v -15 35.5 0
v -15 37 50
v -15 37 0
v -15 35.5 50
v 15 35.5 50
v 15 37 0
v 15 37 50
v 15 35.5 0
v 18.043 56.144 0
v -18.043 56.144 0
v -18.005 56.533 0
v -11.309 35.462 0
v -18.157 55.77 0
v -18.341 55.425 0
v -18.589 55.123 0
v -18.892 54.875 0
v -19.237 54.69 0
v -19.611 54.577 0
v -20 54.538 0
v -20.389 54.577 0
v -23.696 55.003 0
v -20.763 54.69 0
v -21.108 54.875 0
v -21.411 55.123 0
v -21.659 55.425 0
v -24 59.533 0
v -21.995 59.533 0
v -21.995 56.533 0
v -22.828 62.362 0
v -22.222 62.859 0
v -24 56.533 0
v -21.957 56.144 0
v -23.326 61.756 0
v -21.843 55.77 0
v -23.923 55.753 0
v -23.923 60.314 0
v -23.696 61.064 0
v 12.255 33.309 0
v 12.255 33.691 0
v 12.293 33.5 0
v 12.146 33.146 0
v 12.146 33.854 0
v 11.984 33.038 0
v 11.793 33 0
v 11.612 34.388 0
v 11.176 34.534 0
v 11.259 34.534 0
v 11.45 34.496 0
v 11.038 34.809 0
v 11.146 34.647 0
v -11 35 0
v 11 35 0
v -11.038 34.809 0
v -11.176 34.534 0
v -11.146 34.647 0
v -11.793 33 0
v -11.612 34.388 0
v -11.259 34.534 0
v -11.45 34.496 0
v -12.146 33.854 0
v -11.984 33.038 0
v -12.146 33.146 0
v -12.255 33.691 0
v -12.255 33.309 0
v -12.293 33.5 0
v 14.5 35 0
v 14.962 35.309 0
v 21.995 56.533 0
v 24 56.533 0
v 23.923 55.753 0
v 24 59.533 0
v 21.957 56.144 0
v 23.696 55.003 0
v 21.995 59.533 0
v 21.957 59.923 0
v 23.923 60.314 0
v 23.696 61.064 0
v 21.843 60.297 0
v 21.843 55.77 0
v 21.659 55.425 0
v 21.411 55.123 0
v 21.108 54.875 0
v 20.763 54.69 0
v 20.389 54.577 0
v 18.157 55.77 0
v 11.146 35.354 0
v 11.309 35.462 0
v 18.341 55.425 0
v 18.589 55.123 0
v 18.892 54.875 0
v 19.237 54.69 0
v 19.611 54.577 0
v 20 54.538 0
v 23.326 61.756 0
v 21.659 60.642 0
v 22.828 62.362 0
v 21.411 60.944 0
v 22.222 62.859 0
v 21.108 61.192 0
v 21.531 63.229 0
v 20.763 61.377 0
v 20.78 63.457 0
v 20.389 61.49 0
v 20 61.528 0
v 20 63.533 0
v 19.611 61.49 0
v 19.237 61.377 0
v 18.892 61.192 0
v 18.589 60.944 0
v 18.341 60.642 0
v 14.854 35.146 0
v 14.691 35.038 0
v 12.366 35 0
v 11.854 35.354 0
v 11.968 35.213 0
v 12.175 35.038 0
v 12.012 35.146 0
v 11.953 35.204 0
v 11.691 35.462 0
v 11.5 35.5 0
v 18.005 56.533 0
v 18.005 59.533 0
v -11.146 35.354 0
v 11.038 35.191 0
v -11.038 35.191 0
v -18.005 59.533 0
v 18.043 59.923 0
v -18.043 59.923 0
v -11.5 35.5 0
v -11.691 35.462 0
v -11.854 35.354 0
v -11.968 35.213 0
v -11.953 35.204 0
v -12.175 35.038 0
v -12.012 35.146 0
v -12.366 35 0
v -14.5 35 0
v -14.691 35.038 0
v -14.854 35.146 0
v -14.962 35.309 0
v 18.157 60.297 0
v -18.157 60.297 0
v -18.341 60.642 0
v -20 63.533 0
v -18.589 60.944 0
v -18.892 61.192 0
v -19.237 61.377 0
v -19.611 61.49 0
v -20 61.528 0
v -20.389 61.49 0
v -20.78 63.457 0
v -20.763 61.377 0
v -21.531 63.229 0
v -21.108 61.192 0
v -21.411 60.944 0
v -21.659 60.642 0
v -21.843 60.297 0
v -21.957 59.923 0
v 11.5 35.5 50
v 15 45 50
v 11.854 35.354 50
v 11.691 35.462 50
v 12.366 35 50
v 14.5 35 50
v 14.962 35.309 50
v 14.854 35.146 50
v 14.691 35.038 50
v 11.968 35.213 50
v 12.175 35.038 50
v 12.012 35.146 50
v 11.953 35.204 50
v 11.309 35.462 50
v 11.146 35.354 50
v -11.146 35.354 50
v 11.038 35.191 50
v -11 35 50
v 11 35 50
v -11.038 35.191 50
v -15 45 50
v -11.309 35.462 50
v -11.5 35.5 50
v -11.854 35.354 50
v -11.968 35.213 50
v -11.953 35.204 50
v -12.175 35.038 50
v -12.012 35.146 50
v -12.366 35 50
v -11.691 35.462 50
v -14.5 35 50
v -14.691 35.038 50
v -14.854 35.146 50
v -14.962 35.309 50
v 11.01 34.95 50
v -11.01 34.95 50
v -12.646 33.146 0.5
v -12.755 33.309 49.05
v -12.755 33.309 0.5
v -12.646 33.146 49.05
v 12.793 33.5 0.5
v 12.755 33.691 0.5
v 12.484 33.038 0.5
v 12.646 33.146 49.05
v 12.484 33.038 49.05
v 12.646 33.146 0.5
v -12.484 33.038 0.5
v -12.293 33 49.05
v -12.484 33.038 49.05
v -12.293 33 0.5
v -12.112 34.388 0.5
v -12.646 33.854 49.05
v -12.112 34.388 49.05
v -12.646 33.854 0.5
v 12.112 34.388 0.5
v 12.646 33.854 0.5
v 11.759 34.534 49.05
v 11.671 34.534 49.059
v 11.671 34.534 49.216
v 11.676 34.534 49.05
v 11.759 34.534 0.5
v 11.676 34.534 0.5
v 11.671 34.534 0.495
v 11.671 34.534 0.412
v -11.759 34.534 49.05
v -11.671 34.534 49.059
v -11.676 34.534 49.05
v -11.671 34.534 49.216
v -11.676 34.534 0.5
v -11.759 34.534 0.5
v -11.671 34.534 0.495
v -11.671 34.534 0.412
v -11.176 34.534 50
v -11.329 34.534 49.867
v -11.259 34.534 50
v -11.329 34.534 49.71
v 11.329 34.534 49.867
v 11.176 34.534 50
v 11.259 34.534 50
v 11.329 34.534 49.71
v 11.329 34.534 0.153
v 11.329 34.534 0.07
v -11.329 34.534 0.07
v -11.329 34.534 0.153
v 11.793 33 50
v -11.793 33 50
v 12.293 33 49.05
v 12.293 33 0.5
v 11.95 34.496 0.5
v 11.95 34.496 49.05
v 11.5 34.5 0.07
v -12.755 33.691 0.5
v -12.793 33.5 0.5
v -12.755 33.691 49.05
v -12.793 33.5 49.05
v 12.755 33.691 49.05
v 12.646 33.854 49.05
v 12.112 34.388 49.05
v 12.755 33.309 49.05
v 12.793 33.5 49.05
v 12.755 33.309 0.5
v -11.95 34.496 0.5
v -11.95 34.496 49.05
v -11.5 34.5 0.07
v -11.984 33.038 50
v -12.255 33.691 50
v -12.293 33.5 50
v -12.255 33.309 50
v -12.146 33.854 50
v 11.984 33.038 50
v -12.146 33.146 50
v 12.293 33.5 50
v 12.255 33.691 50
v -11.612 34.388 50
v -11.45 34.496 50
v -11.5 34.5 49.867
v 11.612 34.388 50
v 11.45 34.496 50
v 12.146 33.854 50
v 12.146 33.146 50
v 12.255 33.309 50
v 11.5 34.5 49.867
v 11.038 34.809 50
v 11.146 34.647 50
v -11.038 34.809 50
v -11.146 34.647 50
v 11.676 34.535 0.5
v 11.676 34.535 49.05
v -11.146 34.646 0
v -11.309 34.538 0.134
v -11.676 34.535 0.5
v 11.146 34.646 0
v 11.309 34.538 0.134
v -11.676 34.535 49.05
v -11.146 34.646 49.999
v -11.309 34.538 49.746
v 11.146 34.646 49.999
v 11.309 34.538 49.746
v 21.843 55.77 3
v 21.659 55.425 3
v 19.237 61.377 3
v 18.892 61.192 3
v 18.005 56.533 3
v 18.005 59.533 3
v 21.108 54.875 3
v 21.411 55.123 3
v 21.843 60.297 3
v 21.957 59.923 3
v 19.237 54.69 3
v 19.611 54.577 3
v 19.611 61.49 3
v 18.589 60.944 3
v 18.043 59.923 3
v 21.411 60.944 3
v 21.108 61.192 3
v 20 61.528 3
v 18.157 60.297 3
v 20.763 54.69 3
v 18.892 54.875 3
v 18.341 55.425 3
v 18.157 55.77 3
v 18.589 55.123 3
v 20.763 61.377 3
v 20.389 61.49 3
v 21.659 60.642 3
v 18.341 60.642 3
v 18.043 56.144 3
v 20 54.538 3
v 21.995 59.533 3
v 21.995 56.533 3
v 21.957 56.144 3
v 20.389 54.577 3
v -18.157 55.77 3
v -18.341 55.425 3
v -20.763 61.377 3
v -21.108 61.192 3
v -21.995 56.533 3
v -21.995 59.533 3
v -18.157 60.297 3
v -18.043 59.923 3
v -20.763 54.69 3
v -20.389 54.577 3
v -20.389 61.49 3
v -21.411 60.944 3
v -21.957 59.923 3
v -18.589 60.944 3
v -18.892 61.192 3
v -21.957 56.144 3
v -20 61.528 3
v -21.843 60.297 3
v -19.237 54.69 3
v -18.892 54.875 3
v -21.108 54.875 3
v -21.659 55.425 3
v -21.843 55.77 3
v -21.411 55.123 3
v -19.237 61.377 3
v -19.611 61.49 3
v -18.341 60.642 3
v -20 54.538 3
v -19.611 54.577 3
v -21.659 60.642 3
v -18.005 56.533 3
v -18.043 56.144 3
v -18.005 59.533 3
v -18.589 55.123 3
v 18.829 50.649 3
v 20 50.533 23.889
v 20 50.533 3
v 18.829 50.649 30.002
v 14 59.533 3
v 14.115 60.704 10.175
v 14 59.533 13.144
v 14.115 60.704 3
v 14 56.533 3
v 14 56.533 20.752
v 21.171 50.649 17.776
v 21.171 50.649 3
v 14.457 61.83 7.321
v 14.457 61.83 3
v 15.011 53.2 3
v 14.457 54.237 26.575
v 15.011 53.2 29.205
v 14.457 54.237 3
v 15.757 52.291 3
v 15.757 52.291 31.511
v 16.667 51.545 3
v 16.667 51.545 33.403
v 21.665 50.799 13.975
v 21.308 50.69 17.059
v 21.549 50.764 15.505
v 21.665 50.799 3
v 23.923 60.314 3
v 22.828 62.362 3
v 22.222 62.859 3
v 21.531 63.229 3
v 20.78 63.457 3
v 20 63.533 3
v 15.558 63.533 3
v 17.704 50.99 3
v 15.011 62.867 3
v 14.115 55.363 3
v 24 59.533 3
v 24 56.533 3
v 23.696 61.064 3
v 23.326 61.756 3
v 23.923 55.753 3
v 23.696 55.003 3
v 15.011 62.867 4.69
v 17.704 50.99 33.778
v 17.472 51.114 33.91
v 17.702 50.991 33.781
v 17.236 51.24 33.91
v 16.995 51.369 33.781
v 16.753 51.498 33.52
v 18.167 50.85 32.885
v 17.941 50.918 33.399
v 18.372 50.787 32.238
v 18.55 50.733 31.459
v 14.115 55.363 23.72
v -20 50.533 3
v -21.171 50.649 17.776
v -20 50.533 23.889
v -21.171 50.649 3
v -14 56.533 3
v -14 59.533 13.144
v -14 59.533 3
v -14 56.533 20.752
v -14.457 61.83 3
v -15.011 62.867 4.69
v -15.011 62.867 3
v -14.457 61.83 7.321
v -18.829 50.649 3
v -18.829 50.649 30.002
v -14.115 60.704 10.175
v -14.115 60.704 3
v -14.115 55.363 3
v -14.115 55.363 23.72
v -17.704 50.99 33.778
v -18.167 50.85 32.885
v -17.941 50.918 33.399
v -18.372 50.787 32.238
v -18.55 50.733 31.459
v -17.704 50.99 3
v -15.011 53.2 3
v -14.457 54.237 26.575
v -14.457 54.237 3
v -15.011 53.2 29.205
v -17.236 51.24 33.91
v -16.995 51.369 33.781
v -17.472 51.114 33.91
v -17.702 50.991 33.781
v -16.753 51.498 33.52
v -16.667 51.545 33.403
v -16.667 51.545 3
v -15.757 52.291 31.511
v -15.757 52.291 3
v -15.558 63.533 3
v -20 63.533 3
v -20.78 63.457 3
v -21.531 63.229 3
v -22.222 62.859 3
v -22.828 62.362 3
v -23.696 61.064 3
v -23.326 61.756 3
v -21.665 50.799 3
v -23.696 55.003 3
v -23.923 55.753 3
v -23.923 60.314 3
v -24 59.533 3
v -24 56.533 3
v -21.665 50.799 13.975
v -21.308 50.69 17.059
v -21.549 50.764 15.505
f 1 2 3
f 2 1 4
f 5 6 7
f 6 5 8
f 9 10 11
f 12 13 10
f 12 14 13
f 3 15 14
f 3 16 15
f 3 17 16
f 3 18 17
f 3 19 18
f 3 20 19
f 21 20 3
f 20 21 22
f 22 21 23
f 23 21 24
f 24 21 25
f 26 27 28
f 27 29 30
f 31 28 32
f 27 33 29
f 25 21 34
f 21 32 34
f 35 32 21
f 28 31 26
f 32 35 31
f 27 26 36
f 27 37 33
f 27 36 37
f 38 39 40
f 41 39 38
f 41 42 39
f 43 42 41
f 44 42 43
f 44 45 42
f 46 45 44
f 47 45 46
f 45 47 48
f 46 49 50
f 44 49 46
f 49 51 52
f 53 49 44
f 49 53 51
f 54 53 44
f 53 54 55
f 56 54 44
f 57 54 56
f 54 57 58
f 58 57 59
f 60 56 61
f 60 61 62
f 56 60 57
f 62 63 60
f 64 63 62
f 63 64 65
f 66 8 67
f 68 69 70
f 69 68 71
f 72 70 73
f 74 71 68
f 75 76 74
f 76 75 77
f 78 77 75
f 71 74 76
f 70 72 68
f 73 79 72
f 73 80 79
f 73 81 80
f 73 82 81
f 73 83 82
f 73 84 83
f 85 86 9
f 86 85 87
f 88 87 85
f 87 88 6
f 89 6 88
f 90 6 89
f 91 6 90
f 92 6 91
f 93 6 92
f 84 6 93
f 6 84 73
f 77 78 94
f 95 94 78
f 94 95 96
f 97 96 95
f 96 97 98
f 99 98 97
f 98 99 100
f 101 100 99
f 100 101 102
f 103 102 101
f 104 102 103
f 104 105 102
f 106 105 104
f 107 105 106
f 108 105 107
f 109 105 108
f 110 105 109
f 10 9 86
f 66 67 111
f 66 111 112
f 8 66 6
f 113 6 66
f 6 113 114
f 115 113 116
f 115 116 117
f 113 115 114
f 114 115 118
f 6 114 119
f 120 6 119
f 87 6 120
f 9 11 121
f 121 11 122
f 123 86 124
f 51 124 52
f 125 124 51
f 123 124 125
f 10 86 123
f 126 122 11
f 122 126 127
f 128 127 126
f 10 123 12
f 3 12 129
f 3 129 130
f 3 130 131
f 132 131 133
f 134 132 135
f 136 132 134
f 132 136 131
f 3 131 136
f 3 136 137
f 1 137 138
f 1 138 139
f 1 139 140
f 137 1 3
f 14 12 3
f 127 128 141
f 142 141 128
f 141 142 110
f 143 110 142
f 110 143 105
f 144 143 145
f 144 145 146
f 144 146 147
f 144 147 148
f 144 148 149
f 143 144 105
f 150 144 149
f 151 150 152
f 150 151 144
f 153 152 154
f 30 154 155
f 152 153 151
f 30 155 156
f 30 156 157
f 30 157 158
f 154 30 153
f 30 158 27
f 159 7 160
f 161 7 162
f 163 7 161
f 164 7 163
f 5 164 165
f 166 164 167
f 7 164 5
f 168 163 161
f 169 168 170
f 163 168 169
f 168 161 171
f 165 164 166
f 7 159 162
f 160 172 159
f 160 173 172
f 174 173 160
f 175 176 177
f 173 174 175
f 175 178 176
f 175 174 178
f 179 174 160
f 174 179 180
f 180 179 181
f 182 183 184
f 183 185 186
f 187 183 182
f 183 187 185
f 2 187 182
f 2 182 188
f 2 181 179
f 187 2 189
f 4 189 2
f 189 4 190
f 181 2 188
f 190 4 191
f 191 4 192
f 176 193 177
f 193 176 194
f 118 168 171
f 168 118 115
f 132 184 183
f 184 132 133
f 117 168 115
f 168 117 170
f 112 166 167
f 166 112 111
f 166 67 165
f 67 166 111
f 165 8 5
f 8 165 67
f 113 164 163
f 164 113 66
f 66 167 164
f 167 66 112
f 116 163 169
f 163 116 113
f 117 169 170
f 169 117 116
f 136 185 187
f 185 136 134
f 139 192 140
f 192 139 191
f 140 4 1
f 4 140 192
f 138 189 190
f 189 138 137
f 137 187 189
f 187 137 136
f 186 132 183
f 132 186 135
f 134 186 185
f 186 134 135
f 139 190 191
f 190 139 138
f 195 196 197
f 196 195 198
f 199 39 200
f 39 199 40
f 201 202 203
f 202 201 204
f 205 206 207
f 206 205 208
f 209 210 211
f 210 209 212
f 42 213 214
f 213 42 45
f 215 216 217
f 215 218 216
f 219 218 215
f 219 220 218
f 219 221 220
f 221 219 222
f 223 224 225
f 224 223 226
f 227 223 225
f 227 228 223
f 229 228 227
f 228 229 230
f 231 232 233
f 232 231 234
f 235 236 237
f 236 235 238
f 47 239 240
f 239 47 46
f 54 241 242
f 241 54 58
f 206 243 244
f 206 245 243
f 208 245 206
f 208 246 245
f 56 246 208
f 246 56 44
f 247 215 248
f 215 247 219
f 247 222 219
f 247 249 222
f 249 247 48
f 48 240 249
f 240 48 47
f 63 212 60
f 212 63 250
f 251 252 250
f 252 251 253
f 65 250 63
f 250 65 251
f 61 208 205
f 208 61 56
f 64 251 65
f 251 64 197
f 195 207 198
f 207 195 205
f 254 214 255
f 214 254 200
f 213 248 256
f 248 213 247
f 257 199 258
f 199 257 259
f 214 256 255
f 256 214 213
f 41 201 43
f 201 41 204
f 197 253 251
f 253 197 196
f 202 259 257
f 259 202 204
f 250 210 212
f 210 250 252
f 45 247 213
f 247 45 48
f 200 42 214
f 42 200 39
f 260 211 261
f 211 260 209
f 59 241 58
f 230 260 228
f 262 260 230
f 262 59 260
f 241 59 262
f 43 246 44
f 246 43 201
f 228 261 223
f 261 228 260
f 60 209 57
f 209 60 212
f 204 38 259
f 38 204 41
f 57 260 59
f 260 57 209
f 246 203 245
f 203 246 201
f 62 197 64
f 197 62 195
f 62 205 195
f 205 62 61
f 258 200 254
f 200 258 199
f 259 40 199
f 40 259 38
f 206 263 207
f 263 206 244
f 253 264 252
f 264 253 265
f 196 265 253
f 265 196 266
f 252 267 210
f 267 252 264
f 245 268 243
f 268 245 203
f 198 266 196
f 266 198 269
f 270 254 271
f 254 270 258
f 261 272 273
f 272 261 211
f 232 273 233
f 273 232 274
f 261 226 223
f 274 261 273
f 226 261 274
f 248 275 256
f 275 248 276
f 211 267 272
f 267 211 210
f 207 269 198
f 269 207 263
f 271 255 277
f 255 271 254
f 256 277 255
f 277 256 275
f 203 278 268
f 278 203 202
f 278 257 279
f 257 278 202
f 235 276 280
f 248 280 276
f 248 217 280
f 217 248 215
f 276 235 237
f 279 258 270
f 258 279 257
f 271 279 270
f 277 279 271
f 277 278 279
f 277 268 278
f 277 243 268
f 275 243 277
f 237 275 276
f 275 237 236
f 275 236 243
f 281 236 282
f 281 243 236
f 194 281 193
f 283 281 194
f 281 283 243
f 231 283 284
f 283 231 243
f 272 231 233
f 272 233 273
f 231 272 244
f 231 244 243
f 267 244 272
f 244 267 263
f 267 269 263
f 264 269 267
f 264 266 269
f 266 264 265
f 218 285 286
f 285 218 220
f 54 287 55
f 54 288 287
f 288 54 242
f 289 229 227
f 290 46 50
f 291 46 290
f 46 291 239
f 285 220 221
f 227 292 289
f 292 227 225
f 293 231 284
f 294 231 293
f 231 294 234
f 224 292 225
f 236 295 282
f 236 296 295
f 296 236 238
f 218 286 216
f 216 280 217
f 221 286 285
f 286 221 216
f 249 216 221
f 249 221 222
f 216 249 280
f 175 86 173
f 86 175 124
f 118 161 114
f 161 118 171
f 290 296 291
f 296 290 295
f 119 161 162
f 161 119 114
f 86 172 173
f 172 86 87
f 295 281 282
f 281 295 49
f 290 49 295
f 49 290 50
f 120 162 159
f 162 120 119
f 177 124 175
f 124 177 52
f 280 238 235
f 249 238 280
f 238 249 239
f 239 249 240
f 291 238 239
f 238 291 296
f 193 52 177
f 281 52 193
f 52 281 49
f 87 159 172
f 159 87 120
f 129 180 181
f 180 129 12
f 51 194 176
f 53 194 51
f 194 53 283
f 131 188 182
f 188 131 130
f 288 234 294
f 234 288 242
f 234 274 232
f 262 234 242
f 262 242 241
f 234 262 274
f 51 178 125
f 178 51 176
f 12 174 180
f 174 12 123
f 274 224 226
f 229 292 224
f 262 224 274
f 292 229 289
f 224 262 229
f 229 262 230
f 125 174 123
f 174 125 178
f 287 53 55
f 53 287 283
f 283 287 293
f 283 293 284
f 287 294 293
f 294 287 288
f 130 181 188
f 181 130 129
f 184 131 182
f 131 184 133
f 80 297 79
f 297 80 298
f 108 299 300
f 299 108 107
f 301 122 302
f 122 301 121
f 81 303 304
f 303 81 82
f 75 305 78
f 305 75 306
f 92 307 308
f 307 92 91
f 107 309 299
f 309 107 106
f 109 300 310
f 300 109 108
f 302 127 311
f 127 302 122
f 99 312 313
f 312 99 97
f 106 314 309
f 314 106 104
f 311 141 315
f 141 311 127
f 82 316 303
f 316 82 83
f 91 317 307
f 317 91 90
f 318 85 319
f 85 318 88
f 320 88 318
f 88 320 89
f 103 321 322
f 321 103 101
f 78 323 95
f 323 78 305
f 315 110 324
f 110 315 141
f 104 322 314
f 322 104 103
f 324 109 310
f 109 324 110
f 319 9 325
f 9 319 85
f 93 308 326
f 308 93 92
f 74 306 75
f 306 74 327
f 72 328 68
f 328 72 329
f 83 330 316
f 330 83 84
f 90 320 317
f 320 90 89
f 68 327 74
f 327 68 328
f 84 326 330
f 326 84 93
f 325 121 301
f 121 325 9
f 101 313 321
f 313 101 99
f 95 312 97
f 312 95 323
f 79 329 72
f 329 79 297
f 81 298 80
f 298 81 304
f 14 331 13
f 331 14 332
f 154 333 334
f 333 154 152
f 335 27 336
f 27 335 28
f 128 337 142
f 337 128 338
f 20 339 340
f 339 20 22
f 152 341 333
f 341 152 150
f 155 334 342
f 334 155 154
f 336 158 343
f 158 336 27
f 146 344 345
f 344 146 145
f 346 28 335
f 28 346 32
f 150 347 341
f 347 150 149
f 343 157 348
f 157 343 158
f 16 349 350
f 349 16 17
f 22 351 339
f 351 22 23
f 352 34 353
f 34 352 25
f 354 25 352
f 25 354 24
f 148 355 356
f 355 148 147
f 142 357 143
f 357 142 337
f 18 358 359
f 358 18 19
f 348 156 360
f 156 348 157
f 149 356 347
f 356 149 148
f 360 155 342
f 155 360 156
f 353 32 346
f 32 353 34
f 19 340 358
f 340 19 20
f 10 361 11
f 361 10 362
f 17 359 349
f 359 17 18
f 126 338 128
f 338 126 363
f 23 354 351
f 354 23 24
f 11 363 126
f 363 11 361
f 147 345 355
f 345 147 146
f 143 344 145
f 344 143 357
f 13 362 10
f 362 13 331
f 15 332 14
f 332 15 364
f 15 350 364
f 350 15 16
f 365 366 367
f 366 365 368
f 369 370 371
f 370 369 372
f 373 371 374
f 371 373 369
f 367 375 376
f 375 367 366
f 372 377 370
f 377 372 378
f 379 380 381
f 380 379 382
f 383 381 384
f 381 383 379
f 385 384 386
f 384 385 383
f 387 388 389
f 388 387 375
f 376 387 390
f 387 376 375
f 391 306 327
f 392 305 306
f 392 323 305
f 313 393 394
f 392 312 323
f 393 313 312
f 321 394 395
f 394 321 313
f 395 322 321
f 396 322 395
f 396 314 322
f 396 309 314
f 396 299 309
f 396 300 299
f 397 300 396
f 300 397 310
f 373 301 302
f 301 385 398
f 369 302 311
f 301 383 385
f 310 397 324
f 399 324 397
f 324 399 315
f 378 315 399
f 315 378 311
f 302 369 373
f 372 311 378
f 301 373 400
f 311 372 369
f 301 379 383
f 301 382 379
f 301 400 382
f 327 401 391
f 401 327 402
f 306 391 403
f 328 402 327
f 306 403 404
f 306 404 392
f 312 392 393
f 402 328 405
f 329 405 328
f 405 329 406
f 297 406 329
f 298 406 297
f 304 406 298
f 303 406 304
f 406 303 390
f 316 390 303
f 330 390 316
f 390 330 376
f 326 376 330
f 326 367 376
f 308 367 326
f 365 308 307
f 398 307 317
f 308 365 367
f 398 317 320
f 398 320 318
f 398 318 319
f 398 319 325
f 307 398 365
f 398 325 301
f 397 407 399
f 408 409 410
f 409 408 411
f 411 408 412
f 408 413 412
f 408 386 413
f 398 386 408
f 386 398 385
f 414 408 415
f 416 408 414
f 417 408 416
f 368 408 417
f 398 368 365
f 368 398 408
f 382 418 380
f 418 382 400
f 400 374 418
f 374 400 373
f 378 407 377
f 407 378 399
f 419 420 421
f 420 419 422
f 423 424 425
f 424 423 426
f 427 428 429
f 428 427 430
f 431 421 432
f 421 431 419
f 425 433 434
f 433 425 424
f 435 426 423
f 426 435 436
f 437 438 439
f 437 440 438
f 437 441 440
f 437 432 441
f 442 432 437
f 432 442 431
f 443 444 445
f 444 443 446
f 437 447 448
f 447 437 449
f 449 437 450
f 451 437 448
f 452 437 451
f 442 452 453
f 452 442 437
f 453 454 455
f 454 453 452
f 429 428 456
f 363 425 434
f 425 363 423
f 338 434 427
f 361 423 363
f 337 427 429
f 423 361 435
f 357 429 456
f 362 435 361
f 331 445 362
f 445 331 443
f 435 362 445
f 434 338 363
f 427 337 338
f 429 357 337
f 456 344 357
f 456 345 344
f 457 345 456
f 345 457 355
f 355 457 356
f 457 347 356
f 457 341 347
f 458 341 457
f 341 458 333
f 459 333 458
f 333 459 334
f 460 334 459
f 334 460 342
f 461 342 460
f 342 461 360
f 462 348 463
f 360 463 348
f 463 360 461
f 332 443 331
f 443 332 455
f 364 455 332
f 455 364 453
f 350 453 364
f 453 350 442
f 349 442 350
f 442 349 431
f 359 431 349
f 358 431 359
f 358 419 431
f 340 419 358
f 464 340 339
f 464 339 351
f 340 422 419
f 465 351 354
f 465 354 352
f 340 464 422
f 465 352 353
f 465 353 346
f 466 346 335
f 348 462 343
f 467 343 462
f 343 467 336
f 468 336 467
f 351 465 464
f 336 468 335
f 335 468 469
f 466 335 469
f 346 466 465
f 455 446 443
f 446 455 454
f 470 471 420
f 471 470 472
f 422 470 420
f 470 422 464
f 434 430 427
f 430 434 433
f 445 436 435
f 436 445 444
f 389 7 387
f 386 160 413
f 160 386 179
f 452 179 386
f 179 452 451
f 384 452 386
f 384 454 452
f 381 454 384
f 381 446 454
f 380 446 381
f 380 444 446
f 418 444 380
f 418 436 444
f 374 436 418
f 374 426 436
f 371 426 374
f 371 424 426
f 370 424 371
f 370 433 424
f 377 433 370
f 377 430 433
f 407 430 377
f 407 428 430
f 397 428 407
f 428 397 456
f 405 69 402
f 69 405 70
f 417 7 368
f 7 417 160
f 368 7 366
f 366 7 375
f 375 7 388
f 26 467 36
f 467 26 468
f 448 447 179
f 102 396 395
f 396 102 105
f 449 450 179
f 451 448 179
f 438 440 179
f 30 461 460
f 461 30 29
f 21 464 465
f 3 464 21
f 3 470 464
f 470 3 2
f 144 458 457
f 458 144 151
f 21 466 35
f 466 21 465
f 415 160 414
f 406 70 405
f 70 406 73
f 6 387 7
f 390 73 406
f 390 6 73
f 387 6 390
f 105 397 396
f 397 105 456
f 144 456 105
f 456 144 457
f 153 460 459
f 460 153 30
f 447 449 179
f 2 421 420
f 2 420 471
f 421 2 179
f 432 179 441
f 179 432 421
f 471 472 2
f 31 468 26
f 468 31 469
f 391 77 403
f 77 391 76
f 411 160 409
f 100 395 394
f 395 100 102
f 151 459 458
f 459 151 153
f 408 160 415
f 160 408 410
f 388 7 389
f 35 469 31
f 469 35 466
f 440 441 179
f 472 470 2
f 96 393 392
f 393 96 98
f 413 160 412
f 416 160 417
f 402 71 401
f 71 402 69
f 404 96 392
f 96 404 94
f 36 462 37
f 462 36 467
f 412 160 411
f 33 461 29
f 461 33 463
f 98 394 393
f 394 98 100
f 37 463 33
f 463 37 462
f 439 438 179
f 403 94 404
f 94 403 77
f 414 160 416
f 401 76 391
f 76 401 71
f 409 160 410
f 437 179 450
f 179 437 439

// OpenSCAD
// file: illumination.scad
/******************************************************************
*                                                                 *
* OpenFlexure Microscope: Illumination                            *
*                                                                 *
* The illumination module includes the condenser lens mounts and  *
* the arm that holds them.                                        *
*                                                                 *
* (c) Richard Bowman, April 2018                                  *
* Released under the CERN Open Hardware License                   *
*                                                                 *
******************************************************************/

use <./utilities.scad>;
include <./microscope_parameters.scad>;
use <./dovetail.scad>;
front_dovetail_y = 35; // position of the main dovetail
front_dovetail_w = 30; // width of the main dovetail


module each_illumination_arm_screw(){
    // A transform to repeat objects at each mounting point
    for(p=illumination_arm_screws) translate(p) children();
}

module cyl_slot(r=1, h=1, dy=2, center=false){
    hull() repeat([0,dy,0],2,center=true) cylinder(r=r, h=h, center=center);
}

module illumination_arm(){
    // The arm on which we mount the illumination
    bottom_z = illumination_arm_screws[0][2]; // z position where we mount it
    h = 50;
    
    translate([0,front_dovetail_y,bottom_z]) mirror([0,1,0]) dovetail_m([front_dovetail_w, 10, h]);
    
    difference(){
        hull(){
            translate([-front_dovetail_w/2,front_dovetail_y+2,bottom_z]) cube([front_dovetail_w, 10-2, h]);
            each_illumination_arm_screw() cyl_slot(r=4, h=3, dy=3);
        }
        each_illumination_arm_screw() cyl_slot(r=3/2*1.33, h=999, dy=3, center=true);
        each_illumination_arm_screw() translate([0,0,3]) cyl_slot(r=6, h=999, dy=3);
    }
}

// parameters of the lens
pedestal_h = 5.5;
lens_r = 13/2; // for flanged plastic condenser
//lens_r = 16/2; // for 16mm plastic condenser
aperture_r = lens_r-1.1;
lens_t = 1;
base_r = lens_r+2;

lens_assembly_z = 30;
dt_clip = [front_dovetail_w, 16, lens_assembly_z]; //size of the dovetail clip
arm_end_y = front_dovetail_y-dt_clip[1]-4;

module tall_condenser(){
    difference(){
        union(){

            
            // add a bottom
            hull() reflect([1,0,0]){
                translate([0,0,-10]) cylinder(r=base_r, h=lens_assembly_z+d+10);
                translate([-dt_clip[0]/2, arm_end_y,0]) cube([dt_clip[0], 2, lens_assembly_z]);
            }
            
            // mount for the dovetail clip
            translate([-dt_clip[0]/2,arm_end_y,0]) cube([dt_clip[0], 4, dt_clip[2]]);
            
            // the dovetail clip
            translate([0,front_dovetail_y, 0]) mirror([0,1,0]) dovetail_clip(dt_clip, slope_front=2, solid_bottom=0.2);
            
            
            translate([0,0,lens_assembly_z]){
                // the lens holder
                trylinder_gripper(inner_r=lens_r, grip_h=pedestal_h + lens_t/3,h=pedestal_h+lens_t+1.5, base_r=base_r, flare=0.5);
                // pedestal to raise the lens up within the gripper
                cylinder(r=aperture_r+0.8,h=pedestal_h);
            }
        }
        
        // hole for the beam passing through the lens
        translate([0,0,9]) lighttrap_cylinder(r1=led_r+1.5, r2=aperture_r,h=lens_assembly_z-9+d);
        translate([0,0,lens_assembly_z]) cylinder(r=aperture_r,h=999);
        
        // hole for the LED
        //LED
        deformable_hole_trylinder(led_r,led_r+0.7,h=20, center=true);
        cylinder(r=led_r+1.0,h=2,center=true);
        translate([0,0,2-d]) cylinder(r1=led_r+1.0, r2=led_r,h=2,center=true);
    }
}

illumination_arm();
tall_condenser();
// file: microscope_parameters.scad
/******************************************************************
*                                                                 *
* OpenFlexure Microscope: Microscope Parameters                   *
*                                                                 *
* This is the top-level configuration file for the OpenFlexure    *
* microscope, an open microscope and 3-axis translation stage.    *
* It gets really good precision over a ~10mm range, by using      *
* plastic flexure mechanisms.                                     *
*                                                                 *
* Generally I've tried to put parts (or collections of closely    *
* related parts) in their own files.  However, all the parts      *
* depend on the geometry of the microscope - so these parameters  *
* are gathered together here.  In general, the ones you might     *
* to change are towards the top!  Lower-down ones are defined in  *
* terms of higher-up ones - confusion might arise if you redefine *
* these later...                                                  *
*                                                                 *
* (c) Richard Bowman, January 2016                                *
* Released under the CERN Open Hardware License                   *
*                                                                 *
* http://www.github.com/rwb27/openflexure_microscope              *
* http://www.docubricks.com/projects/openflexure-microscope       *
* http://www.waterscope.org                                       *
*                                                                 *
******************************************************************/

d = 0.05;
$fn=32;

// These are the most useful parameters to change!
big_stage = true;
motor_lugs = true;
endstops = false; //motor_lugs;
version_numstring = "5.18.0";
camera = "picamera_2"; //see cameras/camera.scad for valid values
optics = big_stage?"rms_f40d16":"pilens"; //see optics.scad for valid values
led_r = 5/2; //size of the LED used for illumination

// This sets the basic geometry of the microscope
sample_z = big_stage?65:40; // height of the top of the stage
leg_r = big_stage?30:25; // radius of innermost part of legs (stage size)
hole_r = big_stage?15:10; // size of hole in the stage
xy_lever_ratio = big_stage?4.0/7.0:1.0; // mechanical advantage of actuator over stage - can be used to trade speed and precision
z_lever_ratio = 1.0; // as above, for Z axis (must be >1)
// The variables below affect the position of the objective mount
z_strut_l = big_stage?18:15; //length of struts supporting Z carriage
objective_mount_y = big_stage?15:9; // y position of clip for optics
objective_mount_nose_w = 6; // width of the pointy end of the mount
condenser_clip_w = 14; // width of the dovetail clip for the condenser
foot_height = 26; //height of the feet (distance from bottom of body to table) tall feet are 26mm high

// These variables set the dimensions of flexures
// You might want to tweak them if your material (or printer)
// is different from the ones I've tested, though ABS/PLA extrusion
// is generally fine with my parameters
stage_flex_w = 4; // width of XY axis flexures
zflex_l = 1.5;    // length of (all) flexible bits
zflex_t = 0.75;   // thickness of (all) flexible bits
zflex = [stage_flex_w, zflex_l, zflex_t]; // the above in new-style format
flex_a = 0.15;    // sine of the angle through which flexures can be bent

// Compile a sensible version string
version_string = str("v",version_numstring, big_stage?"-LS":"-SS", sample_z, motor_lugs?"-M":"");
echo(str("Compiling OpenFlexure Microscope ",version_string));

stage_t=5; //thickness of the XY stage (at thickest point, most is 1mm less)
flex_z1 = 0;      // z position of lower flexures for XY axis
flex_z2 = sample_z-stage_t; //height of upper XY flexures
z_strut_t = 6;  // (z) thickness of struts for Z axis
z_flex_w = 4;   // width of struts for Z axis
leg = [4,stage_flex_w,flex_z2+zflex_t]; // size of vertical legs
leg_middle_w = 12; // width of the middle part of each leg
actuator_h = 25; //height of the actuator columns
dz = 0.5; //small increment in Z (~ 2 layers)

leg_outer_w = leg_middle_w + 2*zflex_l + 2*leg[0]; // overall width of parallelogram legs that support the stagef
actuator = [3*1.2+2*2,(flex_z2 - flex_z1)*xy_lever_ratio,6]; // dimensions of the core part of the actuating levers for X and Y - NB should match the column_base_r in compact_nut_seat.scad
actuating_nut_r = (flex_z2 - flex_z1)*xy_lever_ratio; // distance from leg_r to the actuating nut/screw for the XY axes
xy_actuator_travel = actuating_nut_r*0.15; // distance moved by XY axis actuators

// Z axis
z_flexures_z1 = 8; // height of the lower Z flexure
z_flexures_z2 = min(sample_z - 12, 35); // " upper "
objective_mount_back_y = objective_mount_y + 5; //back of objective mount
z_anchor_y = objective_mount_back_y + z_strut_l + 2*zflex[1]; // fixed end of the flexure-hinged lever that actuates the Z axis
z_anchor_w = 20; //width of the Z anchor
zll = (z_strut_l + zflex[1])*z_lever_ratio; //required actuator lever length
zfz = z_flexures_z1; // shorthand for the next line only!
z_nut_y = z_anchor_y - zflex[1]/2 + sqrt(zll*zll - zfz*zfz);
z_actuator_travel = zll*0.15; // distance moved by the Z actuator
z_actuator_tilt = -asin(z_flexures_z1/zll); //angle of the Z actuator

z_flexure_x = (leg_r-zflex_l-max(5,leg[2]*0.1))*sqrt(2); // x position of the outside of the Z-axis static anchors (either side of the XY stage, on the X axis) (no longer used by Z axis but still in use elsewhere.)

bridge_dz = 10; // spacing between thin links on legs
base_t=1; // thickness of the flat base of the structure
wall_h=15; // height of the stiffening vertical(ish) walls
wall_t=2; //thickness of the stiffening walls
zawall_h = z_flexures_z2 - 10; //height of wall near Z anchor
zbwall_h = z_flexures_z2 - 10; //height of bridge over Z lever
illumination_clip_y = (-(leg_r-zflex_l-wall_t/2+leg_outer_w/2)/sqrt(2)
                       -wall_t/2-1); //position of clip for
                      // illumination/back foot.  This is set to
                      // coincide with the wall between the back
                      // two legs. TODO: remove this
illumination_arm_screws = [[20,z_nut_y,sample_z-2],[-20,z_nut_y,sample_z-2]];
                      // positions of screws that mount the adjustable version of the 
                      // illumination arm
condenser_clip_y = -8; //position of dovetail for old condenser assembly TODO: rename this
base_mounting_holes = [[-20,z_nut_y-4,0],
                       [20,z_nut_y-4,0],
                       [-z_flexure_x-4,big_stage?-8:-4,0],
                       [z_flexure_x+4,big_stage?-8:-4,0]]; 
                       // holes to screw the microscope to a baseplate
// main file
include <./microscope_parameters.scad>;
use <./illumination.scad>;

translate([0,0,-illumination_arm_screws[0][2]]) illumination_arm();
